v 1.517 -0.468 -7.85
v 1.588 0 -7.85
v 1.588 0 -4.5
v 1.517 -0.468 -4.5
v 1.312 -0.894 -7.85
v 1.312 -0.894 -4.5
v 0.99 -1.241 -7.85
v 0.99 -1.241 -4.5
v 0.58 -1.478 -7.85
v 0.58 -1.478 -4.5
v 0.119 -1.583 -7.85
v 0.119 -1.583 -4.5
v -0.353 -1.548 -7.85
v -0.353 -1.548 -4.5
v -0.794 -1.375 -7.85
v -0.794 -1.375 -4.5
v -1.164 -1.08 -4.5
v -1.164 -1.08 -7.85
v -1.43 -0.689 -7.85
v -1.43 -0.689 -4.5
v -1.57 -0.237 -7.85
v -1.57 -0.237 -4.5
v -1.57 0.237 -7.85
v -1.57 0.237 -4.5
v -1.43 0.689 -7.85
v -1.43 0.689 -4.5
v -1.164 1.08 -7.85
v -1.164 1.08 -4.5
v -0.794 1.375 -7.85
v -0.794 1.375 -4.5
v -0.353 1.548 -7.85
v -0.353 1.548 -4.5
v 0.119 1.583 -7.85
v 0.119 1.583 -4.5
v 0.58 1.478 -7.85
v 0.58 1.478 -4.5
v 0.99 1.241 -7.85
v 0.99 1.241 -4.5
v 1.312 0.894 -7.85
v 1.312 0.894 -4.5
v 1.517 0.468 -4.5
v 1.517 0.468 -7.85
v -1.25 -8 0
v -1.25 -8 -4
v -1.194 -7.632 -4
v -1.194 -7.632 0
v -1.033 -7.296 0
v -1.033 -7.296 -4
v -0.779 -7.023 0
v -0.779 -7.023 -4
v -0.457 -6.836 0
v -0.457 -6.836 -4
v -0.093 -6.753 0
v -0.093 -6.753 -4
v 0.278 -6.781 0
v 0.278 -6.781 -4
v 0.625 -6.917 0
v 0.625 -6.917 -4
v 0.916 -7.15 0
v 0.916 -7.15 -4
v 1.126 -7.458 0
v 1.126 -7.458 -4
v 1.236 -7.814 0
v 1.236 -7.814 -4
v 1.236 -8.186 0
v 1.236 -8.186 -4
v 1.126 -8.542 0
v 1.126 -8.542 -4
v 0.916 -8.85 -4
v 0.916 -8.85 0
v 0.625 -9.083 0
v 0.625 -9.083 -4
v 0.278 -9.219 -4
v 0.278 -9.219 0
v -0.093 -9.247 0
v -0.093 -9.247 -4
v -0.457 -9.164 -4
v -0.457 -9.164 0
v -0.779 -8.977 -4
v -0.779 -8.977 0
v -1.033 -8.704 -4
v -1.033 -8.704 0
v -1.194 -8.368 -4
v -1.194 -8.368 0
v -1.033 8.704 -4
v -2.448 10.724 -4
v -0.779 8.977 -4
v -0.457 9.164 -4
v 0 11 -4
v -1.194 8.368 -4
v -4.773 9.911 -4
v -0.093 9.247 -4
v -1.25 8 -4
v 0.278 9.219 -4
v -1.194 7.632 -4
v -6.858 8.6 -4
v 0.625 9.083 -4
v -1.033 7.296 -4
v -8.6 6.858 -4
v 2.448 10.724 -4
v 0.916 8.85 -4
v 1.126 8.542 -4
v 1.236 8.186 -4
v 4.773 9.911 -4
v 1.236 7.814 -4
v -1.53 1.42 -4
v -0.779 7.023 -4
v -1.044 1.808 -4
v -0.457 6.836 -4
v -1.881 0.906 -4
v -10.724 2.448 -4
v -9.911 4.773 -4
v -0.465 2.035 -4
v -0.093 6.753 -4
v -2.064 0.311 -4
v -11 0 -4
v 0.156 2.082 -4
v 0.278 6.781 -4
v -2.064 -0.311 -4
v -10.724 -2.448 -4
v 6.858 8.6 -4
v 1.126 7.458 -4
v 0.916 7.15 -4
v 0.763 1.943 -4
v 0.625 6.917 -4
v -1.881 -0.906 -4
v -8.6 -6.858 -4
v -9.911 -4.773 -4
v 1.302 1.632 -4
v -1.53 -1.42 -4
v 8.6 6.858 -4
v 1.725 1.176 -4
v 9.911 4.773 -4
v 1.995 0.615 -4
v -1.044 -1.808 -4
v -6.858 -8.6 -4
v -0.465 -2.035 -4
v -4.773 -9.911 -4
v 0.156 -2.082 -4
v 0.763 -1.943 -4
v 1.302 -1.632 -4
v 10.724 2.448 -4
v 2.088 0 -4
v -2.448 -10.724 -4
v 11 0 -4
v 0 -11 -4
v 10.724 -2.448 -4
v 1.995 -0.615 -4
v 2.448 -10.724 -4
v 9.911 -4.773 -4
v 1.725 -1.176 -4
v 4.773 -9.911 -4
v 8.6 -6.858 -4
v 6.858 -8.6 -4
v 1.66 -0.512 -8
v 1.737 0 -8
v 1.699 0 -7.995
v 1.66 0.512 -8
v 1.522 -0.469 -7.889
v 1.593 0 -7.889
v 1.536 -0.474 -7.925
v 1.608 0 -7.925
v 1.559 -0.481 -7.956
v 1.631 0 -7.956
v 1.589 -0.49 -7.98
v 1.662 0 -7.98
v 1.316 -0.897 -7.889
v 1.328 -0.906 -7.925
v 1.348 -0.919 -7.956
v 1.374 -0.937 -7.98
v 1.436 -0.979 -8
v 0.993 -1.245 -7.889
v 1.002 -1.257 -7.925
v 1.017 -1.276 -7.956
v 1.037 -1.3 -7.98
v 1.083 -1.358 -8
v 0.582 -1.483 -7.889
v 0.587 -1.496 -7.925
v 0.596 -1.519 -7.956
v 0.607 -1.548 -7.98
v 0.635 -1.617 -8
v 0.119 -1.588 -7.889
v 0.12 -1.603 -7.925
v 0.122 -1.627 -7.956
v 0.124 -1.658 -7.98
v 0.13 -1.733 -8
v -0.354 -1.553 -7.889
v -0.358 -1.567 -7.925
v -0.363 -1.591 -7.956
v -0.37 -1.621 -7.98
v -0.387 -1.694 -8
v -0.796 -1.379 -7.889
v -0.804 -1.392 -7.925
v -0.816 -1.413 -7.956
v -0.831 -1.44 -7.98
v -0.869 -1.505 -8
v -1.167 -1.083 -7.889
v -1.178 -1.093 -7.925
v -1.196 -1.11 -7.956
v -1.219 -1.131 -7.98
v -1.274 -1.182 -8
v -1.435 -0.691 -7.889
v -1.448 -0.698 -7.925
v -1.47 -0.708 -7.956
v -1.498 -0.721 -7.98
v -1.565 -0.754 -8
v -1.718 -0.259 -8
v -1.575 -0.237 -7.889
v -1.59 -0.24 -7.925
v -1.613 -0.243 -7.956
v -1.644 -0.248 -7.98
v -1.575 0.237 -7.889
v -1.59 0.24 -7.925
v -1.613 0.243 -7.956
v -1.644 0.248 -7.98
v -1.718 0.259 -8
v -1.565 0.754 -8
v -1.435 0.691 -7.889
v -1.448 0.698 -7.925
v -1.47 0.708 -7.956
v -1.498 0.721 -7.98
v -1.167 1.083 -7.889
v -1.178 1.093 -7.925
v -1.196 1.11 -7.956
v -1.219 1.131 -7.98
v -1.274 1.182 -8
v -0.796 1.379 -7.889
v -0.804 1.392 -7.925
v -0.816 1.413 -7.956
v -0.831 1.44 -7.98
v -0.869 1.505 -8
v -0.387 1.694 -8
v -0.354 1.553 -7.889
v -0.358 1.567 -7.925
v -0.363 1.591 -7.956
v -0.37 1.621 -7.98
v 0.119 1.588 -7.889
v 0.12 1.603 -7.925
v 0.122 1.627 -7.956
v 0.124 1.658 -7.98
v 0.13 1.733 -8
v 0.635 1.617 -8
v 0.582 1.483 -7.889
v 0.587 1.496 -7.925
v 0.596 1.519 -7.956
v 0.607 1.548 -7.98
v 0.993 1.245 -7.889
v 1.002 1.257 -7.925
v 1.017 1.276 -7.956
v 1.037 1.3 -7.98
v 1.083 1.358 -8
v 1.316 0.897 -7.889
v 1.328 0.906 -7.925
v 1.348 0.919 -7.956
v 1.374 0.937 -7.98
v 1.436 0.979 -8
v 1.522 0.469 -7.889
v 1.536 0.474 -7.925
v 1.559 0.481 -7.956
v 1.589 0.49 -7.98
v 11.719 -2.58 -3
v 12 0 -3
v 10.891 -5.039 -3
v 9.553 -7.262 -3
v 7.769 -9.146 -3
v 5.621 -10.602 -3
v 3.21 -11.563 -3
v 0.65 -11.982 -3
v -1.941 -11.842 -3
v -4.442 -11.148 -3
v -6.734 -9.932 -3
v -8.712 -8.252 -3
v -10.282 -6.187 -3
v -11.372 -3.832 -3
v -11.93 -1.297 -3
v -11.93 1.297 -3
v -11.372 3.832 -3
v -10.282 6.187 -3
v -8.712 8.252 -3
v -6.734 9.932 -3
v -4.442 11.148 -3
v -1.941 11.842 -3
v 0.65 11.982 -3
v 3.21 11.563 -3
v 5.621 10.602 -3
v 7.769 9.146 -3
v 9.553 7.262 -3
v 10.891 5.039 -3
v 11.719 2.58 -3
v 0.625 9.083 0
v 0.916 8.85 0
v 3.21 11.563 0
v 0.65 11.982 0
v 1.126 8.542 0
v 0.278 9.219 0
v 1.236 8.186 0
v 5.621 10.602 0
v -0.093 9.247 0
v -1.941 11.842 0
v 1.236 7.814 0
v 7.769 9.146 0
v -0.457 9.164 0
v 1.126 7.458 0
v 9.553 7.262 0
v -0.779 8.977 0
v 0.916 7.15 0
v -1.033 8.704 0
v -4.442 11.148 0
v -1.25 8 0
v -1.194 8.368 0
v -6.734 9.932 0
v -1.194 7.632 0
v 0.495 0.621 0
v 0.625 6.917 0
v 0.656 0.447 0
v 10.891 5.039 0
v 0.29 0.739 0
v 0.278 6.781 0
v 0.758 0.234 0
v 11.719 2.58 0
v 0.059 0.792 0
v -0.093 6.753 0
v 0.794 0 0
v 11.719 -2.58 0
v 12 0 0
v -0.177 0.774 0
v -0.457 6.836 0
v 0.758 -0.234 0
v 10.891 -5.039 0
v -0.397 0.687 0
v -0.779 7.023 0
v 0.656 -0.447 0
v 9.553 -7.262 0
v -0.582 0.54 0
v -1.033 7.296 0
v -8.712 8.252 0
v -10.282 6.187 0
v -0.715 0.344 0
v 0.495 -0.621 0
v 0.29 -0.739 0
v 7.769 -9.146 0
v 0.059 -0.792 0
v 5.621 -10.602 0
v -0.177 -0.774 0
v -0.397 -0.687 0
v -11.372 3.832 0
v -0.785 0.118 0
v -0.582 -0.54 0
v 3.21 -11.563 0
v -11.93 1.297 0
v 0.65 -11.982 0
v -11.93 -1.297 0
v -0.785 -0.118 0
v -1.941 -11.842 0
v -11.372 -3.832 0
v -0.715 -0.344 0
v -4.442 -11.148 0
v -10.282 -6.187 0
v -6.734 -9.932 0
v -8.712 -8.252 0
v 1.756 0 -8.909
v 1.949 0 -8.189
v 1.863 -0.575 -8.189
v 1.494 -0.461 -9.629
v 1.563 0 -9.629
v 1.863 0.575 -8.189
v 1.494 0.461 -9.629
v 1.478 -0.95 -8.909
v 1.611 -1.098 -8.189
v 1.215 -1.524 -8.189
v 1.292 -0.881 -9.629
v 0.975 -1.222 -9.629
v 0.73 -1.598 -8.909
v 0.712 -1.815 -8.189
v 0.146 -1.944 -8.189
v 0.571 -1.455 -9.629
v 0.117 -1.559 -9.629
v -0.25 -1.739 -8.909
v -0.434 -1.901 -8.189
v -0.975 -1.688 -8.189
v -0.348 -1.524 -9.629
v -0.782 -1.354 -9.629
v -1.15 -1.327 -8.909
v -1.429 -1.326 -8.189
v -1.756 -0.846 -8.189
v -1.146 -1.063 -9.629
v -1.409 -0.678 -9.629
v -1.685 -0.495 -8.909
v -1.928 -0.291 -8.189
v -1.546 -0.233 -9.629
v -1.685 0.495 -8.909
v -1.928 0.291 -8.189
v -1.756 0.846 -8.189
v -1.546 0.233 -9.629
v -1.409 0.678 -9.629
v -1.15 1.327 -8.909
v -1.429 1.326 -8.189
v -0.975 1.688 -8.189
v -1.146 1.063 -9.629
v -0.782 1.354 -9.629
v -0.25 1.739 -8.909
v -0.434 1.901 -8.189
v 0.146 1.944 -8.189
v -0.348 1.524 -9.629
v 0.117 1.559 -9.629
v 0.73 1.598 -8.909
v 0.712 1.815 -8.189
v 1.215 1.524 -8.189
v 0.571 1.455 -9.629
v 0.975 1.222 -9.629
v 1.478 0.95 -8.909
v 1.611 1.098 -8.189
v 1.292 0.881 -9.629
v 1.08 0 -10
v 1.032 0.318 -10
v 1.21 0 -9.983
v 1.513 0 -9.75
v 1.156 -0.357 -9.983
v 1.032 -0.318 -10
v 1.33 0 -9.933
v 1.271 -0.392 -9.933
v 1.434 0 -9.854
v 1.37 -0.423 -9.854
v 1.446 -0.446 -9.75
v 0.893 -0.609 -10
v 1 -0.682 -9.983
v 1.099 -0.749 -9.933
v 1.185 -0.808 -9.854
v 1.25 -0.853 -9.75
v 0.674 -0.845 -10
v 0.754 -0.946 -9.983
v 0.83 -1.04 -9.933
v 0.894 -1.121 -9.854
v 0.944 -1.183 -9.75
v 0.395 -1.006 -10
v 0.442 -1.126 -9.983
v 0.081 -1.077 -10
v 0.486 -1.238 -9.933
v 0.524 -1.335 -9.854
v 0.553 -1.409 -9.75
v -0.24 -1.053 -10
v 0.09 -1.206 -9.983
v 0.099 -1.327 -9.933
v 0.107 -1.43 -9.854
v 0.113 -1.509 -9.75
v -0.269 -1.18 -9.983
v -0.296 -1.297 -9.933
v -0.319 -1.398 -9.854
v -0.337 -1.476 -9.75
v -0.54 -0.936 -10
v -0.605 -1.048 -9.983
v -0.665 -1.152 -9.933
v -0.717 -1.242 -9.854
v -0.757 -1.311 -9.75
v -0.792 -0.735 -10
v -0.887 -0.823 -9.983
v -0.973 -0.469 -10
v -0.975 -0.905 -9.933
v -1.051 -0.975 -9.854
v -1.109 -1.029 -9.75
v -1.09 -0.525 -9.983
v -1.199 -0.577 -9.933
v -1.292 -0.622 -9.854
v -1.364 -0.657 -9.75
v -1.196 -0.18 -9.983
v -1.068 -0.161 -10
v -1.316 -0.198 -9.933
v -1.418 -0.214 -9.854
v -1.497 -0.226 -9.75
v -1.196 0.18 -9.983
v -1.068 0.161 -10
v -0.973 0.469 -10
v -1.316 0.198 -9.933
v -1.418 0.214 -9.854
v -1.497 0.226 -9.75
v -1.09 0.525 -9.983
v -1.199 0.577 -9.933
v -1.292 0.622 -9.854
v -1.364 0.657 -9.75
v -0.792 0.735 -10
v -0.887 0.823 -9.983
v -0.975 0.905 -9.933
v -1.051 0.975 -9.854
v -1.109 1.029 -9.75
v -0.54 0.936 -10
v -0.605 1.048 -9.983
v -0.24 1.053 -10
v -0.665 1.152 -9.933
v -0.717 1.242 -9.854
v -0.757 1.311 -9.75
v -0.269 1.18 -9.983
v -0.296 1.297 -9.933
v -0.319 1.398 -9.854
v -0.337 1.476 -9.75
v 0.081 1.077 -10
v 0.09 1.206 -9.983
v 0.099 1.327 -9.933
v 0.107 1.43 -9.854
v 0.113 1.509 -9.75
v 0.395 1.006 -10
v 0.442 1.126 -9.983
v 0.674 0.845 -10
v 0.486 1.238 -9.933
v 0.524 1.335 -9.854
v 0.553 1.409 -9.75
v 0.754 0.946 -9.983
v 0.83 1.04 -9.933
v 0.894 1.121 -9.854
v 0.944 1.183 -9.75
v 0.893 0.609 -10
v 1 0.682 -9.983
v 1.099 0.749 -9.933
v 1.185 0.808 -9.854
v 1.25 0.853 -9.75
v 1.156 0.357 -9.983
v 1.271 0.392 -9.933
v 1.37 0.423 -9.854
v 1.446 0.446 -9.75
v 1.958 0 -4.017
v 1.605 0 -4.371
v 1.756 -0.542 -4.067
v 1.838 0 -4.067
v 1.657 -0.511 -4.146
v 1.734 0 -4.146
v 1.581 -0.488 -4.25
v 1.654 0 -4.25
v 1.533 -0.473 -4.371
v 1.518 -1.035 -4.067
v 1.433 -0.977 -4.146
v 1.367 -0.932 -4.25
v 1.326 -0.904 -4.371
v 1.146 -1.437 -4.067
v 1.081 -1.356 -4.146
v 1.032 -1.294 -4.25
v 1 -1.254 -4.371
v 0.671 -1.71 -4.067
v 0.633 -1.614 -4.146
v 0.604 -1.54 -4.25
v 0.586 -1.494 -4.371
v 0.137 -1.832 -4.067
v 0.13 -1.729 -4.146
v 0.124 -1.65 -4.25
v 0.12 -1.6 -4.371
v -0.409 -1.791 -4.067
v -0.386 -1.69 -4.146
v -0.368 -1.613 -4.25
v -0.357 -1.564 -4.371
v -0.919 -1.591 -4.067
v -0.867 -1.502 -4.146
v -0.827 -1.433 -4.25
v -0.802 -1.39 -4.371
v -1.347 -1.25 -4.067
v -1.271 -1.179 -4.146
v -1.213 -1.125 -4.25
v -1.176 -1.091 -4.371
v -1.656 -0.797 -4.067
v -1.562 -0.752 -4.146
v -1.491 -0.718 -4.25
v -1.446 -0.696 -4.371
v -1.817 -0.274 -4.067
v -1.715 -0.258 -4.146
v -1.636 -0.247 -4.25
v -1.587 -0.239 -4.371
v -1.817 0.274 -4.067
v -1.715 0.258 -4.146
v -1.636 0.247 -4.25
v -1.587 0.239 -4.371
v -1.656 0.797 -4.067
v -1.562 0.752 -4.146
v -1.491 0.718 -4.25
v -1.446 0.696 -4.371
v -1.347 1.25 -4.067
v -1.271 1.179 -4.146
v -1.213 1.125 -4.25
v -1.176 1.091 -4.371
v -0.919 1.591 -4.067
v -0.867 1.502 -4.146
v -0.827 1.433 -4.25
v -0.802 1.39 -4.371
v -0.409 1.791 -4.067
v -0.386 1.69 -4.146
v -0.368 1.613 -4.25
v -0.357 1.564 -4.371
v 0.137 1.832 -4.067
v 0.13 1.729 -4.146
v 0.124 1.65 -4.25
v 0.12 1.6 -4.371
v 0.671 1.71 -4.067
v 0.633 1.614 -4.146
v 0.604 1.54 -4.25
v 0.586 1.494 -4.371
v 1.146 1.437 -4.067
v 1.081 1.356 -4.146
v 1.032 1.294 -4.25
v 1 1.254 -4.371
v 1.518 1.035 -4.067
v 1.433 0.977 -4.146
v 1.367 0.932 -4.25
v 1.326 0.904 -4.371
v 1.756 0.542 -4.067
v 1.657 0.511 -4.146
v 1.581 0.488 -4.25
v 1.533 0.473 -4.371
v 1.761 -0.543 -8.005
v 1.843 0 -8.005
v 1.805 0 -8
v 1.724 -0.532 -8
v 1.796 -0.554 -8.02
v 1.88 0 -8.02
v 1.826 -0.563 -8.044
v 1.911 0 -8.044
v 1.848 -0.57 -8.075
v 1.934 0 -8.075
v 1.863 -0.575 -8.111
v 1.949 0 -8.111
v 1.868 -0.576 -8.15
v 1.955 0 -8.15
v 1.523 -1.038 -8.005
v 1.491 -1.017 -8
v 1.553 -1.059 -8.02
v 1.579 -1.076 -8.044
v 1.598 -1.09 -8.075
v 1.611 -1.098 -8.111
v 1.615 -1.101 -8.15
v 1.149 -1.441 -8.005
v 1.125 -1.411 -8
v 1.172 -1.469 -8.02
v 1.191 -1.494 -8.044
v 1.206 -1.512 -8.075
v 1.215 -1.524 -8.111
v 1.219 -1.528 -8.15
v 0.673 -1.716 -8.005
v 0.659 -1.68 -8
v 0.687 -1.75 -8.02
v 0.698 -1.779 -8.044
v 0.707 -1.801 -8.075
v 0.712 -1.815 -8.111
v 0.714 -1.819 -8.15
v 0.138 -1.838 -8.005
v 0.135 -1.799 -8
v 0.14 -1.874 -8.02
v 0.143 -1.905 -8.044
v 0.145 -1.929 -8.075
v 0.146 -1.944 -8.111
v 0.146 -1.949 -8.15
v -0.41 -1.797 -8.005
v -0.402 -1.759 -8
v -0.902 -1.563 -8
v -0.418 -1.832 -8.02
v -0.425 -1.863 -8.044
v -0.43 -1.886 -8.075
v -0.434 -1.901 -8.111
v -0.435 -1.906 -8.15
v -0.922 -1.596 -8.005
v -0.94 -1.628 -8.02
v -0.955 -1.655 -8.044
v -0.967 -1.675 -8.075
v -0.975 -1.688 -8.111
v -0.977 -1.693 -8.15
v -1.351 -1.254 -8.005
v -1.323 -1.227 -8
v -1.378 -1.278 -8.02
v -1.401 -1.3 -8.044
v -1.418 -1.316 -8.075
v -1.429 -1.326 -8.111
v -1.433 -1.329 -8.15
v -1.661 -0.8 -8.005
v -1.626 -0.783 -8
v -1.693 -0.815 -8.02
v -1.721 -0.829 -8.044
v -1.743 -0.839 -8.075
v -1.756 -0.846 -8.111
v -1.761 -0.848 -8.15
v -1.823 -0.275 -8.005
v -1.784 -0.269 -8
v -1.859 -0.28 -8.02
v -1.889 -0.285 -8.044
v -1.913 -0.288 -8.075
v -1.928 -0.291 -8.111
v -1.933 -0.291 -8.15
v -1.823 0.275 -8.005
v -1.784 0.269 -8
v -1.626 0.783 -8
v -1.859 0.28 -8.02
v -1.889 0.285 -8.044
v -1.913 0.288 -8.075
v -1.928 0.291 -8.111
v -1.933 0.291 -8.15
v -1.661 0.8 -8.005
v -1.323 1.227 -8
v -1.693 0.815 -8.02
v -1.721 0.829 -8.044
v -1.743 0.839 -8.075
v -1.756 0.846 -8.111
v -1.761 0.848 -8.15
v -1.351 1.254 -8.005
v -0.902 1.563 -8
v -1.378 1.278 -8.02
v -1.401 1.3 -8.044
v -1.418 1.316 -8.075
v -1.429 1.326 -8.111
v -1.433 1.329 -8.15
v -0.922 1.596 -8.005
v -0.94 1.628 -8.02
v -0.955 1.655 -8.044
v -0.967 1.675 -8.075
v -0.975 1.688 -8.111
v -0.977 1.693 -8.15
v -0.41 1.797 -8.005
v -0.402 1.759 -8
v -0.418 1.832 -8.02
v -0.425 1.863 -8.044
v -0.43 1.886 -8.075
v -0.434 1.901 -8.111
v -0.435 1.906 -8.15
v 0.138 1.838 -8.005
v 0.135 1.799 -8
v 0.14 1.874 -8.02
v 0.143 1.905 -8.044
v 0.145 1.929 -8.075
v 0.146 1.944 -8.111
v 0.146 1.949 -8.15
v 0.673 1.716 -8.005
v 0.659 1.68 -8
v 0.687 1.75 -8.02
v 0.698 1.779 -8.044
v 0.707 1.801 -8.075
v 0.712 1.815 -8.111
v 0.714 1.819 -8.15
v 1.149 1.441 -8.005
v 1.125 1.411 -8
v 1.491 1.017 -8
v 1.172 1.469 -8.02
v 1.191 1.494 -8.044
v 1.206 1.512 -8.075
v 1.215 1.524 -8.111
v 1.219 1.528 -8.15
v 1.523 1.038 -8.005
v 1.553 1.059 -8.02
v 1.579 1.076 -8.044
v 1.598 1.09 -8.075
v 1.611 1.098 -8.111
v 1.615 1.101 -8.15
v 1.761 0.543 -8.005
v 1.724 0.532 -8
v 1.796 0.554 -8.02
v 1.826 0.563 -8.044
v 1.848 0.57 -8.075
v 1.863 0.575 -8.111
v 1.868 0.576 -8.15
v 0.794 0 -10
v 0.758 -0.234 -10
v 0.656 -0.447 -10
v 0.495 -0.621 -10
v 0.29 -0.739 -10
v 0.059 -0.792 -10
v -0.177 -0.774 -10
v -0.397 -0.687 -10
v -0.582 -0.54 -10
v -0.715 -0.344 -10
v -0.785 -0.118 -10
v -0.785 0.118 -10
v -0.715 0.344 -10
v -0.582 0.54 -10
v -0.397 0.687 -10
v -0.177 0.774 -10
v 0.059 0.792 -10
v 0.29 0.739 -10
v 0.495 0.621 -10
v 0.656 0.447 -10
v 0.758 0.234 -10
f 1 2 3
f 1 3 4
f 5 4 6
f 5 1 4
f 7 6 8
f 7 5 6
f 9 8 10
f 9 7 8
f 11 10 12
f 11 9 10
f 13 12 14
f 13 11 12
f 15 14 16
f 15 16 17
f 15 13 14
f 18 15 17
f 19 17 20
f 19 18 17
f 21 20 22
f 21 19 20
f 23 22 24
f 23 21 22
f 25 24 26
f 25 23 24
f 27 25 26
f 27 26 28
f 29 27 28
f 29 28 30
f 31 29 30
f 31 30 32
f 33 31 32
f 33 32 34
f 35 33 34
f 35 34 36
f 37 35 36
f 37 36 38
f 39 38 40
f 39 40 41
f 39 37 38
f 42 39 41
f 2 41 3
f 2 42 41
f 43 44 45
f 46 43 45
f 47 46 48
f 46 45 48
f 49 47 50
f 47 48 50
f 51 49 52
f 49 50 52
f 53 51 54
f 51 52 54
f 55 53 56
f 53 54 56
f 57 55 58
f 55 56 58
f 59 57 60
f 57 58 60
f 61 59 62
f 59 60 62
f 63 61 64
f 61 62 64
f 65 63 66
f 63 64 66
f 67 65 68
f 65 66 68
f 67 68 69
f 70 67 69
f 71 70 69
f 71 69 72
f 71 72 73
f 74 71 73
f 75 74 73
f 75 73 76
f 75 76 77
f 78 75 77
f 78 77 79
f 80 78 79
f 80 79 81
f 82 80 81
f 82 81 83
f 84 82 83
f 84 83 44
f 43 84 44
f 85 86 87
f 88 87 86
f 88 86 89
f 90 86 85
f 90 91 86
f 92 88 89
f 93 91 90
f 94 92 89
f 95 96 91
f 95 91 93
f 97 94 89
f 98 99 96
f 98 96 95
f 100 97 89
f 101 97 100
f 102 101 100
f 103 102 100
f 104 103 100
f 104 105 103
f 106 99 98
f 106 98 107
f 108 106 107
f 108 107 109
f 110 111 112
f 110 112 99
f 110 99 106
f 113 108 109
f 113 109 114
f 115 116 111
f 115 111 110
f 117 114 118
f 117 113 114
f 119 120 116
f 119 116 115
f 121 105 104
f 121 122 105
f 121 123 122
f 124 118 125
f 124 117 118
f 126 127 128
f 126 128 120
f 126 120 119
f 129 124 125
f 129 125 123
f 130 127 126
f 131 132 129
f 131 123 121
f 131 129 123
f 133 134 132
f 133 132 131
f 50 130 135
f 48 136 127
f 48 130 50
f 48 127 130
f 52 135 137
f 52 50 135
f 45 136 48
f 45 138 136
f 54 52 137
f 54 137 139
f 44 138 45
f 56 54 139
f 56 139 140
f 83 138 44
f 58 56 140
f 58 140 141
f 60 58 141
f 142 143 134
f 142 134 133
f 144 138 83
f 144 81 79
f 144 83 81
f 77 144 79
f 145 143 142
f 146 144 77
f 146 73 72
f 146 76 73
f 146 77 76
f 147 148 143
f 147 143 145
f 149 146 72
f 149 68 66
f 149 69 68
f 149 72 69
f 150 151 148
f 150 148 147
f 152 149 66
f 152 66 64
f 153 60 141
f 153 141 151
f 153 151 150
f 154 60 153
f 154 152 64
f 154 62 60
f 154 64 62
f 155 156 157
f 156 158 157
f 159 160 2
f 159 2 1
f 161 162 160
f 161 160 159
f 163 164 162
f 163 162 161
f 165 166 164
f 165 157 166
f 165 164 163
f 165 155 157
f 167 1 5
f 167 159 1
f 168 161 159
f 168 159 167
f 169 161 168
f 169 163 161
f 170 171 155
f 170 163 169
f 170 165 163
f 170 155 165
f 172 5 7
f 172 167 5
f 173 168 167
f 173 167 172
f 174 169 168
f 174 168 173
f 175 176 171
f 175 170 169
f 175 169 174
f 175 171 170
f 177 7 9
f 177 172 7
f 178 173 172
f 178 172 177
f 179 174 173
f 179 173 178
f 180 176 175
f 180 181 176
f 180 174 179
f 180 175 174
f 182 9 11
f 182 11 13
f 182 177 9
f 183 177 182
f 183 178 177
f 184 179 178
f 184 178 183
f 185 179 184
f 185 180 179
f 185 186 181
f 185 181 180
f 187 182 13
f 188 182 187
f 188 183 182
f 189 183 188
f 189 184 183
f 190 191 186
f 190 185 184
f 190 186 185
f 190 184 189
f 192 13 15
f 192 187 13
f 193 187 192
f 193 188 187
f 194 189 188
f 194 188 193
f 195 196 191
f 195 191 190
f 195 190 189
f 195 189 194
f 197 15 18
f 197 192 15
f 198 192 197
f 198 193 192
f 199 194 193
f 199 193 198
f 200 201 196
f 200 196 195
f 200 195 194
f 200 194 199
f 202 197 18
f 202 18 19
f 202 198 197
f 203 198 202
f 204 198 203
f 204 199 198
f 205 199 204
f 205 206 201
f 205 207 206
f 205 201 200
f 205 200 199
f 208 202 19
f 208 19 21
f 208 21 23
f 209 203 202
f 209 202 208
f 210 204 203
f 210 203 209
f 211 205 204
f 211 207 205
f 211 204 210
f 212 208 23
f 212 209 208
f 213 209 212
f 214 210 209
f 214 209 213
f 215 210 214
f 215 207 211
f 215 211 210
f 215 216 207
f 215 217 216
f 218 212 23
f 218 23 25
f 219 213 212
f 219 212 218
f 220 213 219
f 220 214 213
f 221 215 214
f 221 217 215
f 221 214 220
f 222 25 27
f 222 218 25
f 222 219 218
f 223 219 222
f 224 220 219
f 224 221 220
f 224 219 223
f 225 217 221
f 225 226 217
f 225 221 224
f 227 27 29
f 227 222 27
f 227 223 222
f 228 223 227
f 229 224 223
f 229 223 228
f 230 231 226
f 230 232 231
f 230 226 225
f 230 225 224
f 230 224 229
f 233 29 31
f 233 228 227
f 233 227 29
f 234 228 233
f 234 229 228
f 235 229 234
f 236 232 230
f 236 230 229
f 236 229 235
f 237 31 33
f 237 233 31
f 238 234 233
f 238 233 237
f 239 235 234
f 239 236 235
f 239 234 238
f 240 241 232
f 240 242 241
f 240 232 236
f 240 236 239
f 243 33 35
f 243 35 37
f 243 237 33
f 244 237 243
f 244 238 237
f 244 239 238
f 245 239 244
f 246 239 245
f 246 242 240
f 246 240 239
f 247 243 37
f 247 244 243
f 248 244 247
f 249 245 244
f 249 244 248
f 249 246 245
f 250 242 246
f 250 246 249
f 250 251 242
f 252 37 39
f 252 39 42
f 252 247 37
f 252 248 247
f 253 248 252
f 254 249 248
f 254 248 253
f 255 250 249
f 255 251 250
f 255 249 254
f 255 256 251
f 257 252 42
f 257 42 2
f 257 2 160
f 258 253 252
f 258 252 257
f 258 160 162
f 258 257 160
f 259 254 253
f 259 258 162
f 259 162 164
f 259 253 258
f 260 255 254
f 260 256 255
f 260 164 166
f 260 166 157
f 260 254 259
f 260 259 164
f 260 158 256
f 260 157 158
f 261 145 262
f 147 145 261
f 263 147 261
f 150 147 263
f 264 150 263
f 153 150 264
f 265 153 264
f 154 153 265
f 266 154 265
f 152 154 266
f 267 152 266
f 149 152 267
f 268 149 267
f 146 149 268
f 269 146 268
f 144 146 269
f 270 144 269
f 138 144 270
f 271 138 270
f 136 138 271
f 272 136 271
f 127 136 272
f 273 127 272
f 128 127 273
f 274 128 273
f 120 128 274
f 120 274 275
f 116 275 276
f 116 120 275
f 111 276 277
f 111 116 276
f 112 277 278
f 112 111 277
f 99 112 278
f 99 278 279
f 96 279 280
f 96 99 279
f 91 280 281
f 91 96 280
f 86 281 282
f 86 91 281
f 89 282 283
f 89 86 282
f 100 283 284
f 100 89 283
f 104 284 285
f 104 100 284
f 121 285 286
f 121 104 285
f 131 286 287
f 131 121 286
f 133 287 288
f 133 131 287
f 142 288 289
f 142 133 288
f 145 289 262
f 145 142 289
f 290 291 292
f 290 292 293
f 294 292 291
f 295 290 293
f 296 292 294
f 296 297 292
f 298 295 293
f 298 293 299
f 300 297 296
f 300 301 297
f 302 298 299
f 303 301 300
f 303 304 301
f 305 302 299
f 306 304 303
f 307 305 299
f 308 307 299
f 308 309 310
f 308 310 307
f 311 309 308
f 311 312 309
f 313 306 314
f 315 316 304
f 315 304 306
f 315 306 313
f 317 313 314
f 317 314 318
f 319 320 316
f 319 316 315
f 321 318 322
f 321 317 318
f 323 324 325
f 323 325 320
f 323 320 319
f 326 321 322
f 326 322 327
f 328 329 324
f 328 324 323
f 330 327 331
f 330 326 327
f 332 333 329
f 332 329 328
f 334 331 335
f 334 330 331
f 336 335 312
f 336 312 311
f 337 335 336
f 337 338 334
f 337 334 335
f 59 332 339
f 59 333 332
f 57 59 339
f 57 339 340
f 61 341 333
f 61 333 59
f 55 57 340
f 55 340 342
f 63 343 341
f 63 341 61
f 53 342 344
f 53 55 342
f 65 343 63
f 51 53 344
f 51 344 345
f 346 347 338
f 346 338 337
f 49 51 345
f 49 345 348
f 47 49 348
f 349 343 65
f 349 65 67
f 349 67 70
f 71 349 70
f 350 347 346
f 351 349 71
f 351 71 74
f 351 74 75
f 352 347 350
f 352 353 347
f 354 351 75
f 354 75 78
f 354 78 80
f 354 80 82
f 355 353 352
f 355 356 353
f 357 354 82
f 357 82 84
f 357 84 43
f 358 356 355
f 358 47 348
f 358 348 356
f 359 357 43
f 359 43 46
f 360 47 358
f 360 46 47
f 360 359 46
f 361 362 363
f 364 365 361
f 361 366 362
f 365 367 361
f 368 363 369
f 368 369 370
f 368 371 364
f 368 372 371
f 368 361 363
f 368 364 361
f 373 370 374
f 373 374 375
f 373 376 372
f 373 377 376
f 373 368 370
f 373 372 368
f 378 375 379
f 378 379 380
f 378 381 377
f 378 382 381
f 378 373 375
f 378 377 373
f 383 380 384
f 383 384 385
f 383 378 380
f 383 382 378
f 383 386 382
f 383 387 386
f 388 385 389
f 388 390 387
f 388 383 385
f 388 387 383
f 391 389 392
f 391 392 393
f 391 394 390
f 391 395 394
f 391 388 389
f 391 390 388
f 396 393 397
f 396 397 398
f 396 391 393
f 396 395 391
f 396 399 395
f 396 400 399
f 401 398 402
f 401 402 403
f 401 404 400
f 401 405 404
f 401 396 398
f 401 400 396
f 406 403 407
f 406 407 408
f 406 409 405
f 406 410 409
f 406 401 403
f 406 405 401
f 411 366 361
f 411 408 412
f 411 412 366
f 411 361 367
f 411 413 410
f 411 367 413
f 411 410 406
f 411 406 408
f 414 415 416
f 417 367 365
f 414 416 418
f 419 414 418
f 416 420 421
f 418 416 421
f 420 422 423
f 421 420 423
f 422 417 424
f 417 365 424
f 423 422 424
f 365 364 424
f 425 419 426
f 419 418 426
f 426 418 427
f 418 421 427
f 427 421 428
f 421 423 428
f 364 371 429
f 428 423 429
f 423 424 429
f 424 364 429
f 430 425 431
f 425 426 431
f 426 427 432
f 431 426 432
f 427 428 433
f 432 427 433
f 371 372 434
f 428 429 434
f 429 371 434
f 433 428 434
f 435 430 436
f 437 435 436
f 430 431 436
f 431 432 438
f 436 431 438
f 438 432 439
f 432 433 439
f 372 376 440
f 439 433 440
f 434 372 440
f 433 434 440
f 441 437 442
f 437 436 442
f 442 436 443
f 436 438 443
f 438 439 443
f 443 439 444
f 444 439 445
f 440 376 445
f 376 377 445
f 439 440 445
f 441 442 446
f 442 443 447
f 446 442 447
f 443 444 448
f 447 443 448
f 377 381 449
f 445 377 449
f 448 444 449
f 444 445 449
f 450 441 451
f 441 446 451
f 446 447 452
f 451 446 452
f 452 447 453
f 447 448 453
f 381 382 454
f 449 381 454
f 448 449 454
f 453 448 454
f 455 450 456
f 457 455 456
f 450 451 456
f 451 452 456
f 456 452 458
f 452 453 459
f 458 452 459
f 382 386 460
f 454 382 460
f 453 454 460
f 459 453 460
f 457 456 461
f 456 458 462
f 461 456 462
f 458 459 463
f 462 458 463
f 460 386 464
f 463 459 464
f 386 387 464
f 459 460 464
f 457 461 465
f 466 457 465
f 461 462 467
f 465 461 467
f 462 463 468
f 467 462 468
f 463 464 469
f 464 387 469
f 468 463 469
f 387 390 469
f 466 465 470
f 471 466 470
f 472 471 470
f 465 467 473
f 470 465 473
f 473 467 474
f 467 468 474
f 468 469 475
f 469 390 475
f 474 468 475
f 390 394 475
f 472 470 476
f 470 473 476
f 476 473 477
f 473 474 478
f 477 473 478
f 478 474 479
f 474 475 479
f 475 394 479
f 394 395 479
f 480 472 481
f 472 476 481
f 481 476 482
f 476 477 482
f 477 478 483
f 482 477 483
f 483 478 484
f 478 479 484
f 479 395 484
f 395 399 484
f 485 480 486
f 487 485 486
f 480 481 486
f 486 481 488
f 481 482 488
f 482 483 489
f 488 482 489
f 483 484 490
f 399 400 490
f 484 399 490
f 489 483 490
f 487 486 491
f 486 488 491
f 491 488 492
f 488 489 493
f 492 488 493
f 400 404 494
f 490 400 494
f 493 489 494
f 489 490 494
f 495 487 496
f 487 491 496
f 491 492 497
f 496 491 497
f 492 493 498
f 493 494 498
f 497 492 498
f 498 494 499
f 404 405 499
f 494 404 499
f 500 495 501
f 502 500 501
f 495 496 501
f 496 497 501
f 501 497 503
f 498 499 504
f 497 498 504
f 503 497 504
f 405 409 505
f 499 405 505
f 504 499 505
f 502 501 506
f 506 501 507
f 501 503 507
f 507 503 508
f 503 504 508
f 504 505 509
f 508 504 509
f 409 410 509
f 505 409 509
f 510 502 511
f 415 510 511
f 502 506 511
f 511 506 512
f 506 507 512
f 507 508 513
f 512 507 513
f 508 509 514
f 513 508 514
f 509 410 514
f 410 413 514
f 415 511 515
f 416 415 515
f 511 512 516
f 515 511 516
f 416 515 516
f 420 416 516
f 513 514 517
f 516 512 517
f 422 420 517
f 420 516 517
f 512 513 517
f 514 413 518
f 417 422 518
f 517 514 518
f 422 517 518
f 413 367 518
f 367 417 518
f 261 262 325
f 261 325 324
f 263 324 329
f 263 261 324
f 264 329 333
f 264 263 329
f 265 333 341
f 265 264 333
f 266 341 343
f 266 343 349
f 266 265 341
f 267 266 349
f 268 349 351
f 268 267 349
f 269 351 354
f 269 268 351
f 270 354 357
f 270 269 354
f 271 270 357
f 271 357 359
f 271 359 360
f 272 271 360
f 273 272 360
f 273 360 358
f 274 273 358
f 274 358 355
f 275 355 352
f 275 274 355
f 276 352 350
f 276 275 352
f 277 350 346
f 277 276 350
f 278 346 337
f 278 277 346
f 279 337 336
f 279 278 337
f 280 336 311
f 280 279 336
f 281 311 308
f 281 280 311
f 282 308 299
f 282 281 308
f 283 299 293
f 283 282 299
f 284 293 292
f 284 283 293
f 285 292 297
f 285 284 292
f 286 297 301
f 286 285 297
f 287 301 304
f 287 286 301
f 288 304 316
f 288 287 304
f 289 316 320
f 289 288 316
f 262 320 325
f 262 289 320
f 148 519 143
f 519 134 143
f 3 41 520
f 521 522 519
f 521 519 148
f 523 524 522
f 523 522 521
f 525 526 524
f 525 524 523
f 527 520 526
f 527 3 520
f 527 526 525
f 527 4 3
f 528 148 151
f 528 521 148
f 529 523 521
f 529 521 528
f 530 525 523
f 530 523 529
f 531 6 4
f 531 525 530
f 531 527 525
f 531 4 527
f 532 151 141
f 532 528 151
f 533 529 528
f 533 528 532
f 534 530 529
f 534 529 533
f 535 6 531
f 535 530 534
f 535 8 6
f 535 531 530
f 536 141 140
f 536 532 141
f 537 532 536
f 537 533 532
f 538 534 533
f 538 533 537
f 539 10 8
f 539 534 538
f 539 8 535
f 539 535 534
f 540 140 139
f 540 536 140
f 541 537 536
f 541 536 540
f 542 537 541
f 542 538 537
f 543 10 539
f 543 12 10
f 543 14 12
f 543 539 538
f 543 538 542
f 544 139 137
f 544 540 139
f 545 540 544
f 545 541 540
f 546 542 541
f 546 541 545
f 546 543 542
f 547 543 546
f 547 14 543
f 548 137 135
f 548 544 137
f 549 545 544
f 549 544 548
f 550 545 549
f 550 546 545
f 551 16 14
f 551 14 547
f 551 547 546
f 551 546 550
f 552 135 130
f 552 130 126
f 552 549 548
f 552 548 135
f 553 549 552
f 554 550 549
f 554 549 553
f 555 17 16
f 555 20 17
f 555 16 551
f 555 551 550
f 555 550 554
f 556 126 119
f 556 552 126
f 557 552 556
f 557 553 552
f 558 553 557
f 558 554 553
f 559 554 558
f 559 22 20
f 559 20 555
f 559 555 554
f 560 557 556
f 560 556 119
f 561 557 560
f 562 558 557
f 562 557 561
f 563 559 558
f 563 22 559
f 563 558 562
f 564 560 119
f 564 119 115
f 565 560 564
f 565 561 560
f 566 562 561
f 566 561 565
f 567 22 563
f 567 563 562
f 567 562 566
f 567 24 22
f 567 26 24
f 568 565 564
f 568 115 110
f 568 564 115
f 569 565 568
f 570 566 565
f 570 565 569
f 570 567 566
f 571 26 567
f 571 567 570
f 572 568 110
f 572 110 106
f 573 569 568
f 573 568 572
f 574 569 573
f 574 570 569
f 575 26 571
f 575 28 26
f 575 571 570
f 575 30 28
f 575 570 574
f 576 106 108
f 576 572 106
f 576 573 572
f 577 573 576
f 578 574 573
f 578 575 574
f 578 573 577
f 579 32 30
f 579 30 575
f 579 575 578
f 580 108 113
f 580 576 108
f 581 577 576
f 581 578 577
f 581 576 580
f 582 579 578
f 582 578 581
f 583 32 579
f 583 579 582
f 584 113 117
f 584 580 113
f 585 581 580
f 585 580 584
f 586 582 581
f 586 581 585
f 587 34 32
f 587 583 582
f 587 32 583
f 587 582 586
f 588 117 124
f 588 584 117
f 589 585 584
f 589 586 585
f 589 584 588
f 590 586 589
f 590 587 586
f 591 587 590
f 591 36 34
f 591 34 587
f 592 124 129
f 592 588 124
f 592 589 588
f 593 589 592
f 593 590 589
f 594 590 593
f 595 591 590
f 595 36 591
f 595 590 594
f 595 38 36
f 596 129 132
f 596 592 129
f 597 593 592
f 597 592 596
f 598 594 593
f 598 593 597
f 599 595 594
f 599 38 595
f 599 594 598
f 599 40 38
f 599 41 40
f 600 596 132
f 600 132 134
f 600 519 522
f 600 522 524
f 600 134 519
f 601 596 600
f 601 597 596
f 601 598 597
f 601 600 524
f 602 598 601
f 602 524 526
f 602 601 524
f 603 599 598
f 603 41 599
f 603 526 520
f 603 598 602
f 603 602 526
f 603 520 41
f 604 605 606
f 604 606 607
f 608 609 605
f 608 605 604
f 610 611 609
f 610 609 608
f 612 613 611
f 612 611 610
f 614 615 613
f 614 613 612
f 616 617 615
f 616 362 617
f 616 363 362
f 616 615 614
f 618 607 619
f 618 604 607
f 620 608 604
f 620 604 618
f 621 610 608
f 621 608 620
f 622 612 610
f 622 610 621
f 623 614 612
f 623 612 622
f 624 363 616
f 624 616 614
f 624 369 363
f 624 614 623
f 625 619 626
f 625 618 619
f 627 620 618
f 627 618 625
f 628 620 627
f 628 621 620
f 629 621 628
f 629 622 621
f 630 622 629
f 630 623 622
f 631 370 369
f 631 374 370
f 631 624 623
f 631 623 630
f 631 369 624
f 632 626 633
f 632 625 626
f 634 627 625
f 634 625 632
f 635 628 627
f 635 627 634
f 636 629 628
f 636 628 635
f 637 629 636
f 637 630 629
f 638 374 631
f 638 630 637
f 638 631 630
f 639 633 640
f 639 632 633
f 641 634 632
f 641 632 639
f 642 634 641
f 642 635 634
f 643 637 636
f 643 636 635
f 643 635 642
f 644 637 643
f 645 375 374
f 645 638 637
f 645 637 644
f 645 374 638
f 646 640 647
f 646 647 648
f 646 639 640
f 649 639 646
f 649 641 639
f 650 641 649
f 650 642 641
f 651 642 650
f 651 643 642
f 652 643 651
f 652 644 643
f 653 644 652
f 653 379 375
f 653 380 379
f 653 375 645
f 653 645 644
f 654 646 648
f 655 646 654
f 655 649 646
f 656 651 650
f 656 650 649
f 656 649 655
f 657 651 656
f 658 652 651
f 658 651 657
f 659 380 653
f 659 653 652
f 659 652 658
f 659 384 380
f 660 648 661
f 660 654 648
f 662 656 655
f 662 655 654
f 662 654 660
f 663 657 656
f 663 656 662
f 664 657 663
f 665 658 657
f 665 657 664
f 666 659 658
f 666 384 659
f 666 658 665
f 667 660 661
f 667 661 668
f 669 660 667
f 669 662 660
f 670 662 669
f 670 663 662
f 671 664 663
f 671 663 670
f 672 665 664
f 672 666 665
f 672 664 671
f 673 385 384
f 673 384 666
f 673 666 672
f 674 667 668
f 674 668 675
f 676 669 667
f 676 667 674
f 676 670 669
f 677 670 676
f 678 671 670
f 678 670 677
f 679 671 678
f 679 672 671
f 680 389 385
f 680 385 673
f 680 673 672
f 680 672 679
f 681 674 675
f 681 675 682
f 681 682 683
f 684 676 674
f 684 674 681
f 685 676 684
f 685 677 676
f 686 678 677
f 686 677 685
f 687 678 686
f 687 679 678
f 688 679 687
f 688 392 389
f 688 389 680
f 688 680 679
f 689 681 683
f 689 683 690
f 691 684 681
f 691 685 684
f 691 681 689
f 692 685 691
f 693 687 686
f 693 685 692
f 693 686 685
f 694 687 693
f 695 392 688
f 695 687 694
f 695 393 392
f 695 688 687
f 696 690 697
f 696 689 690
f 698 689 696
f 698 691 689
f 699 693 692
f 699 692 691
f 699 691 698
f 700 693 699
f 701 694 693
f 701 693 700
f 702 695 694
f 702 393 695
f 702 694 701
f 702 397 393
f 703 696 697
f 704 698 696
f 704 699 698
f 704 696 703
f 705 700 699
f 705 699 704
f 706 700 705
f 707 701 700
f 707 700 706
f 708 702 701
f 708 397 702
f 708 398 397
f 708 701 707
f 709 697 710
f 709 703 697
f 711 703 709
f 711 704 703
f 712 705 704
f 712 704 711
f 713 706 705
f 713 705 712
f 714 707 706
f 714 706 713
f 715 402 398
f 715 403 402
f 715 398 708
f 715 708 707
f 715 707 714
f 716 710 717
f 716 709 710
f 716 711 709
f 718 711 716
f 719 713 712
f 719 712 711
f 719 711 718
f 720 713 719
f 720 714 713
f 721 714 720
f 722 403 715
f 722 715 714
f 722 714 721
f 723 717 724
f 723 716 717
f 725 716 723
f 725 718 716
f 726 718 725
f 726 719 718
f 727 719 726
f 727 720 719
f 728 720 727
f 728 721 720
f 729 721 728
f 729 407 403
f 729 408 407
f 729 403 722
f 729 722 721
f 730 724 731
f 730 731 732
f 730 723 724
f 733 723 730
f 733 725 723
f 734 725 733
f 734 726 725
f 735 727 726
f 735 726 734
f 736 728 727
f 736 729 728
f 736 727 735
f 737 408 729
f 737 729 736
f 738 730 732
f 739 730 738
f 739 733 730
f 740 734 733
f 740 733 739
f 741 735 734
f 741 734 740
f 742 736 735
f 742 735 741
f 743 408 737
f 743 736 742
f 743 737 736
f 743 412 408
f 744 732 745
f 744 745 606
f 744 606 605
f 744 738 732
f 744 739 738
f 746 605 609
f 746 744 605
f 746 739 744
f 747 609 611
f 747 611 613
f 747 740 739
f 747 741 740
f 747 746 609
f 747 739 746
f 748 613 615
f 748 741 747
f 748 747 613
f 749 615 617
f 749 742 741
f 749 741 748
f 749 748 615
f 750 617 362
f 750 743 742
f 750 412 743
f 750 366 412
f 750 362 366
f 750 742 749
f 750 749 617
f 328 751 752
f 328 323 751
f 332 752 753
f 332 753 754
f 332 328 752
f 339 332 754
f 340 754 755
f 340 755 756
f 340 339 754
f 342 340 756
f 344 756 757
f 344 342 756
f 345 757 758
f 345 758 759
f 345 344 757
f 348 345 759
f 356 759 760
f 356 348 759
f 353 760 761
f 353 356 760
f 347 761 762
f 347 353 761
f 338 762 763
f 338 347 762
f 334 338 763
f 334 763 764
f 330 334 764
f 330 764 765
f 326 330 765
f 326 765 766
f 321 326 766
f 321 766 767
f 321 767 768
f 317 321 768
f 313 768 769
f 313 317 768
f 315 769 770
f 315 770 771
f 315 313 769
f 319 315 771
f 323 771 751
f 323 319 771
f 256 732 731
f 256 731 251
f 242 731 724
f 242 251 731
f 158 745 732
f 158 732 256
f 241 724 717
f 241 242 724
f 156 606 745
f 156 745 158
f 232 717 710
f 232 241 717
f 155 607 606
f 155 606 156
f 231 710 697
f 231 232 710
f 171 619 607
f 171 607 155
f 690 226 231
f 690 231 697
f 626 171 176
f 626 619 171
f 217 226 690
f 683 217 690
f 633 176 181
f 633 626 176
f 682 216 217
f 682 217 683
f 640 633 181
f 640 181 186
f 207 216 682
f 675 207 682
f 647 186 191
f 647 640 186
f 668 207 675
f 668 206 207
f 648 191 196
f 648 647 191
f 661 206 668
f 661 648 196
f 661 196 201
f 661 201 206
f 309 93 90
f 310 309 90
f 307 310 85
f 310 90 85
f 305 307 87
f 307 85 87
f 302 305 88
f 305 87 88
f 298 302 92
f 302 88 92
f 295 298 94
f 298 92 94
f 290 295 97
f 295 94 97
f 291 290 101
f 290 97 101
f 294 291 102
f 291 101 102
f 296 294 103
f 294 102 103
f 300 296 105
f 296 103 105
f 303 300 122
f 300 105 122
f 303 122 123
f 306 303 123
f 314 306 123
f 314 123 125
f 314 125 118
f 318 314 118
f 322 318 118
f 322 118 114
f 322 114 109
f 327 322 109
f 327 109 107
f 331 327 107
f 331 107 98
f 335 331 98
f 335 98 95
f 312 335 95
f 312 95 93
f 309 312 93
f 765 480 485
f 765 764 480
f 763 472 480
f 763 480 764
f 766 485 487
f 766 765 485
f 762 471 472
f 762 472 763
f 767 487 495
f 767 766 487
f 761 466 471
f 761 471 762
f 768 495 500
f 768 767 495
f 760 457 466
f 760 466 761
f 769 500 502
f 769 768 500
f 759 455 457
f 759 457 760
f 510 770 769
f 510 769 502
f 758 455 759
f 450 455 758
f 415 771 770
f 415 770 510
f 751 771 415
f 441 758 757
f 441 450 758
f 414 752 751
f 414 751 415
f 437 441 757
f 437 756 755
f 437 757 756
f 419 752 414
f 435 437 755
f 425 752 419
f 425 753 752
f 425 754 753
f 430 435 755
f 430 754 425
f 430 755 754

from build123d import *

# Parameters (mm, degrees)
TAP_DRILL_FOR_M3X0_5_TAP1_D = 2.5
CHAMFER1_SIZE               = 1
FILLET1_R                   = 0.5
FILLET2_R                   = 0.15


with BuildPart() as part:
    # Sketch1 → Revolve1 (revolve)
    with BuildSketch(Plane(origin=(0, 0, 0), x_dir=(1, 0, 0), z_dir=(0, 1, 0))):
        Polygon((0.79375, 0), (12, 0), (12, 4), (1.5875, 4), (1.5875, 8), (2, 8), (1.464101615, 10), (0.79375, 10), align=None)
    revolve(axis=Axis((0, 0, 0), (0, 0, -1)))

    # Tap Drill for M3x0.5 Tap1 (through all)
    with Locations(Plane.XY):
        with Locations((0, 8), (0, -8)):
            Hole(TAP_DRILL_FOR_M3X0_5_TAP1_D / 2)

    # Chamfer1
    chamfer1_edges = [part.edges().sort_by_distance(p)[0] for p in [
        (-12, 0, -4),
    ]]
    chamfer(chamfer1_edges, length=CHAMFER1_SIZE)

    # Fillet1
    fillet1_edges = [part.edges().sort_by_distance(p)[0] for p in [
        (-1.464101615, 0, -10),
        (-1.5875, 0, -4),
    ]]
    fillet(fillet1_edges, radius=FILLET1_R)

    # Fillet2
    fillet2_edges = [part.edges().sort_by_distance(p)[0] for p in [
        (-2, 0, -8),
        (-1.5875, 0, -8),
    ]]
    fillet(fillet2_edges, radius=FILLET2_R)


solid = part.part
